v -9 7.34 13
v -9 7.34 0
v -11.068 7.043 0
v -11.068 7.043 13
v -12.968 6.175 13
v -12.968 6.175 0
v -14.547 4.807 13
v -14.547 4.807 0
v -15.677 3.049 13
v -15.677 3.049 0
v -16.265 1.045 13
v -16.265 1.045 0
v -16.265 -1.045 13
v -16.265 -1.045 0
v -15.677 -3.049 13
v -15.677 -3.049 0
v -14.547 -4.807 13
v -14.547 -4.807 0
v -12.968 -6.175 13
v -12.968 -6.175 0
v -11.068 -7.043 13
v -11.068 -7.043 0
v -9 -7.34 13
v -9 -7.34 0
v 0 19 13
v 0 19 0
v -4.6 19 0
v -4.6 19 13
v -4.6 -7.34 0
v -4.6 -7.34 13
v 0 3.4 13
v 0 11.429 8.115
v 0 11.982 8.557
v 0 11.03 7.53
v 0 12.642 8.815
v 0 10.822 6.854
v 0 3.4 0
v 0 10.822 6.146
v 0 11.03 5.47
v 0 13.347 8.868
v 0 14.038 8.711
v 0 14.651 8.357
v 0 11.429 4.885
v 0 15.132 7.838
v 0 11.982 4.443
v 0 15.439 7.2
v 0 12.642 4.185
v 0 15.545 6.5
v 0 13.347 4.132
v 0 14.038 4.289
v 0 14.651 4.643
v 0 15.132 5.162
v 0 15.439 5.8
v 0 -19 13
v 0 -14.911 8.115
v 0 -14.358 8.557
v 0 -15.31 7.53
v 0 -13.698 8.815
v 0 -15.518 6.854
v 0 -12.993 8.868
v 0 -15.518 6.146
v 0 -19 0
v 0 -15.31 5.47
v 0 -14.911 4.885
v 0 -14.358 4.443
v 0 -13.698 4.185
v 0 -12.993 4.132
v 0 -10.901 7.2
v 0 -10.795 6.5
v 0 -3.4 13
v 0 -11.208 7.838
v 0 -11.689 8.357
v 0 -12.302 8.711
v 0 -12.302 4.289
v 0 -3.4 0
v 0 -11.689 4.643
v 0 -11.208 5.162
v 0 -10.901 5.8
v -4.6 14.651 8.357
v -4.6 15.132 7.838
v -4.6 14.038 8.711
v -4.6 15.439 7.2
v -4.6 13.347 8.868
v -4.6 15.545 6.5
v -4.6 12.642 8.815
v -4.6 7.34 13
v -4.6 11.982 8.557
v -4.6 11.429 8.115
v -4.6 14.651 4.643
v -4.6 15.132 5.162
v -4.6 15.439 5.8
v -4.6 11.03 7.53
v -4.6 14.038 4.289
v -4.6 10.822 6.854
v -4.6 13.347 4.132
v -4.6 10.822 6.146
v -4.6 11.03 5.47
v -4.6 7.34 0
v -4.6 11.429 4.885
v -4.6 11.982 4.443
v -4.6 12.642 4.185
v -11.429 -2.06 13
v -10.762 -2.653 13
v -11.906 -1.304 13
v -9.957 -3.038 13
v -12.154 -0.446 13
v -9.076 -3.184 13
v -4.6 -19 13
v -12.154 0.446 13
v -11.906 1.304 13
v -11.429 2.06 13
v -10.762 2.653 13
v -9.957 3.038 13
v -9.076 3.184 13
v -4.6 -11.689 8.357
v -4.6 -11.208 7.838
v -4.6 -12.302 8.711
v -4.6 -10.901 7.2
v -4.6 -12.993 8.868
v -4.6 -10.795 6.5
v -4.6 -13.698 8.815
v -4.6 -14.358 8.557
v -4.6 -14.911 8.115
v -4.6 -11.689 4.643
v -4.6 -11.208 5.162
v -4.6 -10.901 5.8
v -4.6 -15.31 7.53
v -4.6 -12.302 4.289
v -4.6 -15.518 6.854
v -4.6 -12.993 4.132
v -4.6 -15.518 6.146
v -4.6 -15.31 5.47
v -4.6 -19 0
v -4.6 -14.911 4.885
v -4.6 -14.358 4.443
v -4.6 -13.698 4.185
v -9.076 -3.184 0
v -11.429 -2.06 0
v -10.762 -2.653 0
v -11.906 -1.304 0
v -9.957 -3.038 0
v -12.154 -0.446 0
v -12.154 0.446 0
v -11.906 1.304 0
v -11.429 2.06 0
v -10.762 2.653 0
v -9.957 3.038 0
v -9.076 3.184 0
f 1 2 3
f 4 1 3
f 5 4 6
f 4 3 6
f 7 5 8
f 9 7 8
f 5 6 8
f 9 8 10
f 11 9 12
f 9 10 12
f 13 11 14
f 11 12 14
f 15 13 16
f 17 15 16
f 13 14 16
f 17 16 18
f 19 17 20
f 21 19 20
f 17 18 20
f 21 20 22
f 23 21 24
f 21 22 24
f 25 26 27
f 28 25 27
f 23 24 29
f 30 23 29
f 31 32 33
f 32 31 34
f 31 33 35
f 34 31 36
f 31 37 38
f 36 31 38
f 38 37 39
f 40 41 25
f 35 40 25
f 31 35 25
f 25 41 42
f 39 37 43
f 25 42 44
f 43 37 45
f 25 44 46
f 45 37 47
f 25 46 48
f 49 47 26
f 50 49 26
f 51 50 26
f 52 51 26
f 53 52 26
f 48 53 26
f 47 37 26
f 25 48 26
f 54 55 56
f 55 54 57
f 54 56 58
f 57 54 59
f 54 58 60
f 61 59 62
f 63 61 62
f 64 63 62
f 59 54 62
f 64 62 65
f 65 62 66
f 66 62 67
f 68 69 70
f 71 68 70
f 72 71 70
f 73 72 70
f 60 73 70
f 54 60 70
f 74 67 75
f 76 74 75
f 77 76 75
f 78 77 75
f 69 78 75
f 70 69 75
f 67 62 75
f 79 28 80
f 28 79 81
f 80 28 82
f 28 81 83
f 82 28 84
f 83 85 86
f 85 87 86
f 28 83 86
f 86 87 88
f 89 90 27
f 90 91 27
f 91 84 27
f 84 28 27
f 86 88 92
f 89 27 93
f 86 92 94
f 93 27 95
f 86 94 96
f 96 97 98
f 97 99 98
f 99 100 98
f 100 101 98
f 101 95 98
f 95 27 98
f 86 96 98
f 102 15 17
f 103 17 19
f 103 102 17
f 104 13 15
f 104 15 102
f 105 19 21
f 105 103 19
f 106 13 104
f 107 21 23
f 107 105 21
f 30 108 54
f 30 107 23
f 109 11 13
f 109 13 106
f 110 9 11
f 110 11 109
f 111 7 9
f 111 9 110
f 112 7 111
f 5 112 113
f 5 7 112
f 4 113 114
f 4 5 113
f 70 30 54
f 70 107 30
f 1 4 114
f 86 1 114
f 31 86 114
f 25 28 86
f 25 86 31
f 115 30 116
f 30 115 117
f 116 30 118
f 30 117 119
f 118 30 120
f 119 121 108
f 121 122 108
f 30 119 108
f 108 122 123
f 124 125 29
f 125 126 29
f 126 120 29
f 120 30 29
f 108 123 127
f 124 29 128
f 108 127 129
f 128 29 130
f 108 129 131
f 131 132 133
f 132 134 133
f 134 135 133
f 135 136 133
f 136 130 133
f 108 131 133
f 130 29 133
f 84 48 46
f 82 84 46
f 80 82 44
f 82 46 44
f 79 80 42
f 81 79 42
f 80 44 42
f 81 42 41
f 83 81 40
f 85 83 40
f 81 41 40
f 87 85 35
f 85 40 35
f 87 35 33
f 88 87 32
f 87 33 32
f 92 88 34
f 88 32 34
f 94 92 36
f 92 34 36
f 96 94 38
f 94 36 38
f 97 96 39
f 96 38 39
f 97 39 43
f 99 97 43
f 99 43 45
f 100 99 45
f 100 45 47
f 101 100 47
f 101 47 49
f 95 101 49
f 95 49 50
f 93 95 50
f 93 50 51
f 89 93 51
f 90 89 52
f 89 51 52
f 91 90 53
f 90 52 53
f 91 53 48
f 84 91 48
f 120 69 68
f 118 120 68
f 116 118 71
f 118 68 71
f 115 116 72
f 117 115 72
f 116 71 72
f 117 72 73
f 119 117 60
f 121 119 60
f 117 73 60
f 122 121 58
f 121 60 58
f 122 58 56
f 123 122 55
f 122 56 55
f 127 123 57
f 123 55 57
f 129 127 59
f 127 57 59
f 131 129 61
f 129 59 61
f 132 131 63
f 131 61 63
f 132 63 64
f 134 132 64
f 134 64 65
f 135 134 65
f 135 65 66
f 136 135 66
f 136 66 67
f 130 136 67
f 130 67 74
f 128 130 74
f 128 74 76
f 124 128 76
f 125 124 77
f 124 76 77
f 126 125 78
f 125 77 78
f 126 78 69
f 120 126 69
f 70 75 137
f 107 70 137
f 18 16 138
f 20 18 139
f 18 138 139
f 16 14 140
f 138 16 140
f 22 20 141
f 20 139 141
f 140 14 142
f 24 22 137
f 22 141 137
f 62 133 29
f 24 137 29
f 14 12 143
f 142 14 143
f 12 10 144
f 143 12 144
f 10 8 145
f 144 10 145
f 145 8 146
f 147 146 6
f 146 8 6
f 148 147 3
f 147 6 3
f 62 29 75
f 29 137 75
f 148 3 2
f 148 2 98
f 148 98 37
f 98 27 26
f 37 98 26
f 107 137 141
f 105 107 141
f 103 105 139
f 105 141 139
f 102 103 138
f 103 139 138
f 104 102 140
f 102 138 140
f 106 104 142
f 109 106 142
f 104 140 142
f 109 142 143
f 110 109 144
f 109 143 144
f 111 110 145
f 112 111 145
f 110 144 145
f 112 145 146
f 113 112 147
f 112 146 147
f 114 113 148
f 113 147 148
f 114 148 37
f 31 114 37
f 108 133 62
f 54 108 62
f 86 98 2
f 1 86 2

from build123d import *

# Parameters (mm, degrees)
F1_DEPTH = 13
F2_R     = 2.375
F3_DEPTH = 4.6


with BuildPart() as f1:
    # F0 (on Top) → F1 (new body)
    with BuildSketch(Plane.XY):
        with BuildLine():
            Line((-4.6, -19), (0, -19))
            Line((0, -19), (0, -3.4))
            Line((0, -3.4), (-9.075746, -3.184099))
            ThreePointArc((-9.075746, -3.184099), (-12.185, 0), (-9.075746, 3.184099))
            Line((-9.075746, 3.184099), (0, 3.4))
            Line((0, 3.4), (0, 19))
            Line((0, 19), (-4.6, 19))
            Line((-4.6, 19), (-4.6, 7.34))
            Line((-4.6, 7.34), (-9, 7.34))
            ThreePointArc((-9, 7.34), (-16.34, 0), (-9, -7.34))
            Line((-9, -7.34), (-4.6, -7.34))
            Line((-4.6, -7.34), (-4.6, -19))
        make_face()
    extrude(amount=F1_DEPTH)

    # F2 (on Right) → F3 (cut, through all)
    with BuildSketch(Plane.YZ):
        with Locations((-13.17, 6.5)):
            Circle(F2_R)
        with Locations((13.17, 6.5)):
            Circle(F2_R)
    extrude(amount=-F3_DEPTH, mode=Mode.SUBTRACT)


solid = f1.part
